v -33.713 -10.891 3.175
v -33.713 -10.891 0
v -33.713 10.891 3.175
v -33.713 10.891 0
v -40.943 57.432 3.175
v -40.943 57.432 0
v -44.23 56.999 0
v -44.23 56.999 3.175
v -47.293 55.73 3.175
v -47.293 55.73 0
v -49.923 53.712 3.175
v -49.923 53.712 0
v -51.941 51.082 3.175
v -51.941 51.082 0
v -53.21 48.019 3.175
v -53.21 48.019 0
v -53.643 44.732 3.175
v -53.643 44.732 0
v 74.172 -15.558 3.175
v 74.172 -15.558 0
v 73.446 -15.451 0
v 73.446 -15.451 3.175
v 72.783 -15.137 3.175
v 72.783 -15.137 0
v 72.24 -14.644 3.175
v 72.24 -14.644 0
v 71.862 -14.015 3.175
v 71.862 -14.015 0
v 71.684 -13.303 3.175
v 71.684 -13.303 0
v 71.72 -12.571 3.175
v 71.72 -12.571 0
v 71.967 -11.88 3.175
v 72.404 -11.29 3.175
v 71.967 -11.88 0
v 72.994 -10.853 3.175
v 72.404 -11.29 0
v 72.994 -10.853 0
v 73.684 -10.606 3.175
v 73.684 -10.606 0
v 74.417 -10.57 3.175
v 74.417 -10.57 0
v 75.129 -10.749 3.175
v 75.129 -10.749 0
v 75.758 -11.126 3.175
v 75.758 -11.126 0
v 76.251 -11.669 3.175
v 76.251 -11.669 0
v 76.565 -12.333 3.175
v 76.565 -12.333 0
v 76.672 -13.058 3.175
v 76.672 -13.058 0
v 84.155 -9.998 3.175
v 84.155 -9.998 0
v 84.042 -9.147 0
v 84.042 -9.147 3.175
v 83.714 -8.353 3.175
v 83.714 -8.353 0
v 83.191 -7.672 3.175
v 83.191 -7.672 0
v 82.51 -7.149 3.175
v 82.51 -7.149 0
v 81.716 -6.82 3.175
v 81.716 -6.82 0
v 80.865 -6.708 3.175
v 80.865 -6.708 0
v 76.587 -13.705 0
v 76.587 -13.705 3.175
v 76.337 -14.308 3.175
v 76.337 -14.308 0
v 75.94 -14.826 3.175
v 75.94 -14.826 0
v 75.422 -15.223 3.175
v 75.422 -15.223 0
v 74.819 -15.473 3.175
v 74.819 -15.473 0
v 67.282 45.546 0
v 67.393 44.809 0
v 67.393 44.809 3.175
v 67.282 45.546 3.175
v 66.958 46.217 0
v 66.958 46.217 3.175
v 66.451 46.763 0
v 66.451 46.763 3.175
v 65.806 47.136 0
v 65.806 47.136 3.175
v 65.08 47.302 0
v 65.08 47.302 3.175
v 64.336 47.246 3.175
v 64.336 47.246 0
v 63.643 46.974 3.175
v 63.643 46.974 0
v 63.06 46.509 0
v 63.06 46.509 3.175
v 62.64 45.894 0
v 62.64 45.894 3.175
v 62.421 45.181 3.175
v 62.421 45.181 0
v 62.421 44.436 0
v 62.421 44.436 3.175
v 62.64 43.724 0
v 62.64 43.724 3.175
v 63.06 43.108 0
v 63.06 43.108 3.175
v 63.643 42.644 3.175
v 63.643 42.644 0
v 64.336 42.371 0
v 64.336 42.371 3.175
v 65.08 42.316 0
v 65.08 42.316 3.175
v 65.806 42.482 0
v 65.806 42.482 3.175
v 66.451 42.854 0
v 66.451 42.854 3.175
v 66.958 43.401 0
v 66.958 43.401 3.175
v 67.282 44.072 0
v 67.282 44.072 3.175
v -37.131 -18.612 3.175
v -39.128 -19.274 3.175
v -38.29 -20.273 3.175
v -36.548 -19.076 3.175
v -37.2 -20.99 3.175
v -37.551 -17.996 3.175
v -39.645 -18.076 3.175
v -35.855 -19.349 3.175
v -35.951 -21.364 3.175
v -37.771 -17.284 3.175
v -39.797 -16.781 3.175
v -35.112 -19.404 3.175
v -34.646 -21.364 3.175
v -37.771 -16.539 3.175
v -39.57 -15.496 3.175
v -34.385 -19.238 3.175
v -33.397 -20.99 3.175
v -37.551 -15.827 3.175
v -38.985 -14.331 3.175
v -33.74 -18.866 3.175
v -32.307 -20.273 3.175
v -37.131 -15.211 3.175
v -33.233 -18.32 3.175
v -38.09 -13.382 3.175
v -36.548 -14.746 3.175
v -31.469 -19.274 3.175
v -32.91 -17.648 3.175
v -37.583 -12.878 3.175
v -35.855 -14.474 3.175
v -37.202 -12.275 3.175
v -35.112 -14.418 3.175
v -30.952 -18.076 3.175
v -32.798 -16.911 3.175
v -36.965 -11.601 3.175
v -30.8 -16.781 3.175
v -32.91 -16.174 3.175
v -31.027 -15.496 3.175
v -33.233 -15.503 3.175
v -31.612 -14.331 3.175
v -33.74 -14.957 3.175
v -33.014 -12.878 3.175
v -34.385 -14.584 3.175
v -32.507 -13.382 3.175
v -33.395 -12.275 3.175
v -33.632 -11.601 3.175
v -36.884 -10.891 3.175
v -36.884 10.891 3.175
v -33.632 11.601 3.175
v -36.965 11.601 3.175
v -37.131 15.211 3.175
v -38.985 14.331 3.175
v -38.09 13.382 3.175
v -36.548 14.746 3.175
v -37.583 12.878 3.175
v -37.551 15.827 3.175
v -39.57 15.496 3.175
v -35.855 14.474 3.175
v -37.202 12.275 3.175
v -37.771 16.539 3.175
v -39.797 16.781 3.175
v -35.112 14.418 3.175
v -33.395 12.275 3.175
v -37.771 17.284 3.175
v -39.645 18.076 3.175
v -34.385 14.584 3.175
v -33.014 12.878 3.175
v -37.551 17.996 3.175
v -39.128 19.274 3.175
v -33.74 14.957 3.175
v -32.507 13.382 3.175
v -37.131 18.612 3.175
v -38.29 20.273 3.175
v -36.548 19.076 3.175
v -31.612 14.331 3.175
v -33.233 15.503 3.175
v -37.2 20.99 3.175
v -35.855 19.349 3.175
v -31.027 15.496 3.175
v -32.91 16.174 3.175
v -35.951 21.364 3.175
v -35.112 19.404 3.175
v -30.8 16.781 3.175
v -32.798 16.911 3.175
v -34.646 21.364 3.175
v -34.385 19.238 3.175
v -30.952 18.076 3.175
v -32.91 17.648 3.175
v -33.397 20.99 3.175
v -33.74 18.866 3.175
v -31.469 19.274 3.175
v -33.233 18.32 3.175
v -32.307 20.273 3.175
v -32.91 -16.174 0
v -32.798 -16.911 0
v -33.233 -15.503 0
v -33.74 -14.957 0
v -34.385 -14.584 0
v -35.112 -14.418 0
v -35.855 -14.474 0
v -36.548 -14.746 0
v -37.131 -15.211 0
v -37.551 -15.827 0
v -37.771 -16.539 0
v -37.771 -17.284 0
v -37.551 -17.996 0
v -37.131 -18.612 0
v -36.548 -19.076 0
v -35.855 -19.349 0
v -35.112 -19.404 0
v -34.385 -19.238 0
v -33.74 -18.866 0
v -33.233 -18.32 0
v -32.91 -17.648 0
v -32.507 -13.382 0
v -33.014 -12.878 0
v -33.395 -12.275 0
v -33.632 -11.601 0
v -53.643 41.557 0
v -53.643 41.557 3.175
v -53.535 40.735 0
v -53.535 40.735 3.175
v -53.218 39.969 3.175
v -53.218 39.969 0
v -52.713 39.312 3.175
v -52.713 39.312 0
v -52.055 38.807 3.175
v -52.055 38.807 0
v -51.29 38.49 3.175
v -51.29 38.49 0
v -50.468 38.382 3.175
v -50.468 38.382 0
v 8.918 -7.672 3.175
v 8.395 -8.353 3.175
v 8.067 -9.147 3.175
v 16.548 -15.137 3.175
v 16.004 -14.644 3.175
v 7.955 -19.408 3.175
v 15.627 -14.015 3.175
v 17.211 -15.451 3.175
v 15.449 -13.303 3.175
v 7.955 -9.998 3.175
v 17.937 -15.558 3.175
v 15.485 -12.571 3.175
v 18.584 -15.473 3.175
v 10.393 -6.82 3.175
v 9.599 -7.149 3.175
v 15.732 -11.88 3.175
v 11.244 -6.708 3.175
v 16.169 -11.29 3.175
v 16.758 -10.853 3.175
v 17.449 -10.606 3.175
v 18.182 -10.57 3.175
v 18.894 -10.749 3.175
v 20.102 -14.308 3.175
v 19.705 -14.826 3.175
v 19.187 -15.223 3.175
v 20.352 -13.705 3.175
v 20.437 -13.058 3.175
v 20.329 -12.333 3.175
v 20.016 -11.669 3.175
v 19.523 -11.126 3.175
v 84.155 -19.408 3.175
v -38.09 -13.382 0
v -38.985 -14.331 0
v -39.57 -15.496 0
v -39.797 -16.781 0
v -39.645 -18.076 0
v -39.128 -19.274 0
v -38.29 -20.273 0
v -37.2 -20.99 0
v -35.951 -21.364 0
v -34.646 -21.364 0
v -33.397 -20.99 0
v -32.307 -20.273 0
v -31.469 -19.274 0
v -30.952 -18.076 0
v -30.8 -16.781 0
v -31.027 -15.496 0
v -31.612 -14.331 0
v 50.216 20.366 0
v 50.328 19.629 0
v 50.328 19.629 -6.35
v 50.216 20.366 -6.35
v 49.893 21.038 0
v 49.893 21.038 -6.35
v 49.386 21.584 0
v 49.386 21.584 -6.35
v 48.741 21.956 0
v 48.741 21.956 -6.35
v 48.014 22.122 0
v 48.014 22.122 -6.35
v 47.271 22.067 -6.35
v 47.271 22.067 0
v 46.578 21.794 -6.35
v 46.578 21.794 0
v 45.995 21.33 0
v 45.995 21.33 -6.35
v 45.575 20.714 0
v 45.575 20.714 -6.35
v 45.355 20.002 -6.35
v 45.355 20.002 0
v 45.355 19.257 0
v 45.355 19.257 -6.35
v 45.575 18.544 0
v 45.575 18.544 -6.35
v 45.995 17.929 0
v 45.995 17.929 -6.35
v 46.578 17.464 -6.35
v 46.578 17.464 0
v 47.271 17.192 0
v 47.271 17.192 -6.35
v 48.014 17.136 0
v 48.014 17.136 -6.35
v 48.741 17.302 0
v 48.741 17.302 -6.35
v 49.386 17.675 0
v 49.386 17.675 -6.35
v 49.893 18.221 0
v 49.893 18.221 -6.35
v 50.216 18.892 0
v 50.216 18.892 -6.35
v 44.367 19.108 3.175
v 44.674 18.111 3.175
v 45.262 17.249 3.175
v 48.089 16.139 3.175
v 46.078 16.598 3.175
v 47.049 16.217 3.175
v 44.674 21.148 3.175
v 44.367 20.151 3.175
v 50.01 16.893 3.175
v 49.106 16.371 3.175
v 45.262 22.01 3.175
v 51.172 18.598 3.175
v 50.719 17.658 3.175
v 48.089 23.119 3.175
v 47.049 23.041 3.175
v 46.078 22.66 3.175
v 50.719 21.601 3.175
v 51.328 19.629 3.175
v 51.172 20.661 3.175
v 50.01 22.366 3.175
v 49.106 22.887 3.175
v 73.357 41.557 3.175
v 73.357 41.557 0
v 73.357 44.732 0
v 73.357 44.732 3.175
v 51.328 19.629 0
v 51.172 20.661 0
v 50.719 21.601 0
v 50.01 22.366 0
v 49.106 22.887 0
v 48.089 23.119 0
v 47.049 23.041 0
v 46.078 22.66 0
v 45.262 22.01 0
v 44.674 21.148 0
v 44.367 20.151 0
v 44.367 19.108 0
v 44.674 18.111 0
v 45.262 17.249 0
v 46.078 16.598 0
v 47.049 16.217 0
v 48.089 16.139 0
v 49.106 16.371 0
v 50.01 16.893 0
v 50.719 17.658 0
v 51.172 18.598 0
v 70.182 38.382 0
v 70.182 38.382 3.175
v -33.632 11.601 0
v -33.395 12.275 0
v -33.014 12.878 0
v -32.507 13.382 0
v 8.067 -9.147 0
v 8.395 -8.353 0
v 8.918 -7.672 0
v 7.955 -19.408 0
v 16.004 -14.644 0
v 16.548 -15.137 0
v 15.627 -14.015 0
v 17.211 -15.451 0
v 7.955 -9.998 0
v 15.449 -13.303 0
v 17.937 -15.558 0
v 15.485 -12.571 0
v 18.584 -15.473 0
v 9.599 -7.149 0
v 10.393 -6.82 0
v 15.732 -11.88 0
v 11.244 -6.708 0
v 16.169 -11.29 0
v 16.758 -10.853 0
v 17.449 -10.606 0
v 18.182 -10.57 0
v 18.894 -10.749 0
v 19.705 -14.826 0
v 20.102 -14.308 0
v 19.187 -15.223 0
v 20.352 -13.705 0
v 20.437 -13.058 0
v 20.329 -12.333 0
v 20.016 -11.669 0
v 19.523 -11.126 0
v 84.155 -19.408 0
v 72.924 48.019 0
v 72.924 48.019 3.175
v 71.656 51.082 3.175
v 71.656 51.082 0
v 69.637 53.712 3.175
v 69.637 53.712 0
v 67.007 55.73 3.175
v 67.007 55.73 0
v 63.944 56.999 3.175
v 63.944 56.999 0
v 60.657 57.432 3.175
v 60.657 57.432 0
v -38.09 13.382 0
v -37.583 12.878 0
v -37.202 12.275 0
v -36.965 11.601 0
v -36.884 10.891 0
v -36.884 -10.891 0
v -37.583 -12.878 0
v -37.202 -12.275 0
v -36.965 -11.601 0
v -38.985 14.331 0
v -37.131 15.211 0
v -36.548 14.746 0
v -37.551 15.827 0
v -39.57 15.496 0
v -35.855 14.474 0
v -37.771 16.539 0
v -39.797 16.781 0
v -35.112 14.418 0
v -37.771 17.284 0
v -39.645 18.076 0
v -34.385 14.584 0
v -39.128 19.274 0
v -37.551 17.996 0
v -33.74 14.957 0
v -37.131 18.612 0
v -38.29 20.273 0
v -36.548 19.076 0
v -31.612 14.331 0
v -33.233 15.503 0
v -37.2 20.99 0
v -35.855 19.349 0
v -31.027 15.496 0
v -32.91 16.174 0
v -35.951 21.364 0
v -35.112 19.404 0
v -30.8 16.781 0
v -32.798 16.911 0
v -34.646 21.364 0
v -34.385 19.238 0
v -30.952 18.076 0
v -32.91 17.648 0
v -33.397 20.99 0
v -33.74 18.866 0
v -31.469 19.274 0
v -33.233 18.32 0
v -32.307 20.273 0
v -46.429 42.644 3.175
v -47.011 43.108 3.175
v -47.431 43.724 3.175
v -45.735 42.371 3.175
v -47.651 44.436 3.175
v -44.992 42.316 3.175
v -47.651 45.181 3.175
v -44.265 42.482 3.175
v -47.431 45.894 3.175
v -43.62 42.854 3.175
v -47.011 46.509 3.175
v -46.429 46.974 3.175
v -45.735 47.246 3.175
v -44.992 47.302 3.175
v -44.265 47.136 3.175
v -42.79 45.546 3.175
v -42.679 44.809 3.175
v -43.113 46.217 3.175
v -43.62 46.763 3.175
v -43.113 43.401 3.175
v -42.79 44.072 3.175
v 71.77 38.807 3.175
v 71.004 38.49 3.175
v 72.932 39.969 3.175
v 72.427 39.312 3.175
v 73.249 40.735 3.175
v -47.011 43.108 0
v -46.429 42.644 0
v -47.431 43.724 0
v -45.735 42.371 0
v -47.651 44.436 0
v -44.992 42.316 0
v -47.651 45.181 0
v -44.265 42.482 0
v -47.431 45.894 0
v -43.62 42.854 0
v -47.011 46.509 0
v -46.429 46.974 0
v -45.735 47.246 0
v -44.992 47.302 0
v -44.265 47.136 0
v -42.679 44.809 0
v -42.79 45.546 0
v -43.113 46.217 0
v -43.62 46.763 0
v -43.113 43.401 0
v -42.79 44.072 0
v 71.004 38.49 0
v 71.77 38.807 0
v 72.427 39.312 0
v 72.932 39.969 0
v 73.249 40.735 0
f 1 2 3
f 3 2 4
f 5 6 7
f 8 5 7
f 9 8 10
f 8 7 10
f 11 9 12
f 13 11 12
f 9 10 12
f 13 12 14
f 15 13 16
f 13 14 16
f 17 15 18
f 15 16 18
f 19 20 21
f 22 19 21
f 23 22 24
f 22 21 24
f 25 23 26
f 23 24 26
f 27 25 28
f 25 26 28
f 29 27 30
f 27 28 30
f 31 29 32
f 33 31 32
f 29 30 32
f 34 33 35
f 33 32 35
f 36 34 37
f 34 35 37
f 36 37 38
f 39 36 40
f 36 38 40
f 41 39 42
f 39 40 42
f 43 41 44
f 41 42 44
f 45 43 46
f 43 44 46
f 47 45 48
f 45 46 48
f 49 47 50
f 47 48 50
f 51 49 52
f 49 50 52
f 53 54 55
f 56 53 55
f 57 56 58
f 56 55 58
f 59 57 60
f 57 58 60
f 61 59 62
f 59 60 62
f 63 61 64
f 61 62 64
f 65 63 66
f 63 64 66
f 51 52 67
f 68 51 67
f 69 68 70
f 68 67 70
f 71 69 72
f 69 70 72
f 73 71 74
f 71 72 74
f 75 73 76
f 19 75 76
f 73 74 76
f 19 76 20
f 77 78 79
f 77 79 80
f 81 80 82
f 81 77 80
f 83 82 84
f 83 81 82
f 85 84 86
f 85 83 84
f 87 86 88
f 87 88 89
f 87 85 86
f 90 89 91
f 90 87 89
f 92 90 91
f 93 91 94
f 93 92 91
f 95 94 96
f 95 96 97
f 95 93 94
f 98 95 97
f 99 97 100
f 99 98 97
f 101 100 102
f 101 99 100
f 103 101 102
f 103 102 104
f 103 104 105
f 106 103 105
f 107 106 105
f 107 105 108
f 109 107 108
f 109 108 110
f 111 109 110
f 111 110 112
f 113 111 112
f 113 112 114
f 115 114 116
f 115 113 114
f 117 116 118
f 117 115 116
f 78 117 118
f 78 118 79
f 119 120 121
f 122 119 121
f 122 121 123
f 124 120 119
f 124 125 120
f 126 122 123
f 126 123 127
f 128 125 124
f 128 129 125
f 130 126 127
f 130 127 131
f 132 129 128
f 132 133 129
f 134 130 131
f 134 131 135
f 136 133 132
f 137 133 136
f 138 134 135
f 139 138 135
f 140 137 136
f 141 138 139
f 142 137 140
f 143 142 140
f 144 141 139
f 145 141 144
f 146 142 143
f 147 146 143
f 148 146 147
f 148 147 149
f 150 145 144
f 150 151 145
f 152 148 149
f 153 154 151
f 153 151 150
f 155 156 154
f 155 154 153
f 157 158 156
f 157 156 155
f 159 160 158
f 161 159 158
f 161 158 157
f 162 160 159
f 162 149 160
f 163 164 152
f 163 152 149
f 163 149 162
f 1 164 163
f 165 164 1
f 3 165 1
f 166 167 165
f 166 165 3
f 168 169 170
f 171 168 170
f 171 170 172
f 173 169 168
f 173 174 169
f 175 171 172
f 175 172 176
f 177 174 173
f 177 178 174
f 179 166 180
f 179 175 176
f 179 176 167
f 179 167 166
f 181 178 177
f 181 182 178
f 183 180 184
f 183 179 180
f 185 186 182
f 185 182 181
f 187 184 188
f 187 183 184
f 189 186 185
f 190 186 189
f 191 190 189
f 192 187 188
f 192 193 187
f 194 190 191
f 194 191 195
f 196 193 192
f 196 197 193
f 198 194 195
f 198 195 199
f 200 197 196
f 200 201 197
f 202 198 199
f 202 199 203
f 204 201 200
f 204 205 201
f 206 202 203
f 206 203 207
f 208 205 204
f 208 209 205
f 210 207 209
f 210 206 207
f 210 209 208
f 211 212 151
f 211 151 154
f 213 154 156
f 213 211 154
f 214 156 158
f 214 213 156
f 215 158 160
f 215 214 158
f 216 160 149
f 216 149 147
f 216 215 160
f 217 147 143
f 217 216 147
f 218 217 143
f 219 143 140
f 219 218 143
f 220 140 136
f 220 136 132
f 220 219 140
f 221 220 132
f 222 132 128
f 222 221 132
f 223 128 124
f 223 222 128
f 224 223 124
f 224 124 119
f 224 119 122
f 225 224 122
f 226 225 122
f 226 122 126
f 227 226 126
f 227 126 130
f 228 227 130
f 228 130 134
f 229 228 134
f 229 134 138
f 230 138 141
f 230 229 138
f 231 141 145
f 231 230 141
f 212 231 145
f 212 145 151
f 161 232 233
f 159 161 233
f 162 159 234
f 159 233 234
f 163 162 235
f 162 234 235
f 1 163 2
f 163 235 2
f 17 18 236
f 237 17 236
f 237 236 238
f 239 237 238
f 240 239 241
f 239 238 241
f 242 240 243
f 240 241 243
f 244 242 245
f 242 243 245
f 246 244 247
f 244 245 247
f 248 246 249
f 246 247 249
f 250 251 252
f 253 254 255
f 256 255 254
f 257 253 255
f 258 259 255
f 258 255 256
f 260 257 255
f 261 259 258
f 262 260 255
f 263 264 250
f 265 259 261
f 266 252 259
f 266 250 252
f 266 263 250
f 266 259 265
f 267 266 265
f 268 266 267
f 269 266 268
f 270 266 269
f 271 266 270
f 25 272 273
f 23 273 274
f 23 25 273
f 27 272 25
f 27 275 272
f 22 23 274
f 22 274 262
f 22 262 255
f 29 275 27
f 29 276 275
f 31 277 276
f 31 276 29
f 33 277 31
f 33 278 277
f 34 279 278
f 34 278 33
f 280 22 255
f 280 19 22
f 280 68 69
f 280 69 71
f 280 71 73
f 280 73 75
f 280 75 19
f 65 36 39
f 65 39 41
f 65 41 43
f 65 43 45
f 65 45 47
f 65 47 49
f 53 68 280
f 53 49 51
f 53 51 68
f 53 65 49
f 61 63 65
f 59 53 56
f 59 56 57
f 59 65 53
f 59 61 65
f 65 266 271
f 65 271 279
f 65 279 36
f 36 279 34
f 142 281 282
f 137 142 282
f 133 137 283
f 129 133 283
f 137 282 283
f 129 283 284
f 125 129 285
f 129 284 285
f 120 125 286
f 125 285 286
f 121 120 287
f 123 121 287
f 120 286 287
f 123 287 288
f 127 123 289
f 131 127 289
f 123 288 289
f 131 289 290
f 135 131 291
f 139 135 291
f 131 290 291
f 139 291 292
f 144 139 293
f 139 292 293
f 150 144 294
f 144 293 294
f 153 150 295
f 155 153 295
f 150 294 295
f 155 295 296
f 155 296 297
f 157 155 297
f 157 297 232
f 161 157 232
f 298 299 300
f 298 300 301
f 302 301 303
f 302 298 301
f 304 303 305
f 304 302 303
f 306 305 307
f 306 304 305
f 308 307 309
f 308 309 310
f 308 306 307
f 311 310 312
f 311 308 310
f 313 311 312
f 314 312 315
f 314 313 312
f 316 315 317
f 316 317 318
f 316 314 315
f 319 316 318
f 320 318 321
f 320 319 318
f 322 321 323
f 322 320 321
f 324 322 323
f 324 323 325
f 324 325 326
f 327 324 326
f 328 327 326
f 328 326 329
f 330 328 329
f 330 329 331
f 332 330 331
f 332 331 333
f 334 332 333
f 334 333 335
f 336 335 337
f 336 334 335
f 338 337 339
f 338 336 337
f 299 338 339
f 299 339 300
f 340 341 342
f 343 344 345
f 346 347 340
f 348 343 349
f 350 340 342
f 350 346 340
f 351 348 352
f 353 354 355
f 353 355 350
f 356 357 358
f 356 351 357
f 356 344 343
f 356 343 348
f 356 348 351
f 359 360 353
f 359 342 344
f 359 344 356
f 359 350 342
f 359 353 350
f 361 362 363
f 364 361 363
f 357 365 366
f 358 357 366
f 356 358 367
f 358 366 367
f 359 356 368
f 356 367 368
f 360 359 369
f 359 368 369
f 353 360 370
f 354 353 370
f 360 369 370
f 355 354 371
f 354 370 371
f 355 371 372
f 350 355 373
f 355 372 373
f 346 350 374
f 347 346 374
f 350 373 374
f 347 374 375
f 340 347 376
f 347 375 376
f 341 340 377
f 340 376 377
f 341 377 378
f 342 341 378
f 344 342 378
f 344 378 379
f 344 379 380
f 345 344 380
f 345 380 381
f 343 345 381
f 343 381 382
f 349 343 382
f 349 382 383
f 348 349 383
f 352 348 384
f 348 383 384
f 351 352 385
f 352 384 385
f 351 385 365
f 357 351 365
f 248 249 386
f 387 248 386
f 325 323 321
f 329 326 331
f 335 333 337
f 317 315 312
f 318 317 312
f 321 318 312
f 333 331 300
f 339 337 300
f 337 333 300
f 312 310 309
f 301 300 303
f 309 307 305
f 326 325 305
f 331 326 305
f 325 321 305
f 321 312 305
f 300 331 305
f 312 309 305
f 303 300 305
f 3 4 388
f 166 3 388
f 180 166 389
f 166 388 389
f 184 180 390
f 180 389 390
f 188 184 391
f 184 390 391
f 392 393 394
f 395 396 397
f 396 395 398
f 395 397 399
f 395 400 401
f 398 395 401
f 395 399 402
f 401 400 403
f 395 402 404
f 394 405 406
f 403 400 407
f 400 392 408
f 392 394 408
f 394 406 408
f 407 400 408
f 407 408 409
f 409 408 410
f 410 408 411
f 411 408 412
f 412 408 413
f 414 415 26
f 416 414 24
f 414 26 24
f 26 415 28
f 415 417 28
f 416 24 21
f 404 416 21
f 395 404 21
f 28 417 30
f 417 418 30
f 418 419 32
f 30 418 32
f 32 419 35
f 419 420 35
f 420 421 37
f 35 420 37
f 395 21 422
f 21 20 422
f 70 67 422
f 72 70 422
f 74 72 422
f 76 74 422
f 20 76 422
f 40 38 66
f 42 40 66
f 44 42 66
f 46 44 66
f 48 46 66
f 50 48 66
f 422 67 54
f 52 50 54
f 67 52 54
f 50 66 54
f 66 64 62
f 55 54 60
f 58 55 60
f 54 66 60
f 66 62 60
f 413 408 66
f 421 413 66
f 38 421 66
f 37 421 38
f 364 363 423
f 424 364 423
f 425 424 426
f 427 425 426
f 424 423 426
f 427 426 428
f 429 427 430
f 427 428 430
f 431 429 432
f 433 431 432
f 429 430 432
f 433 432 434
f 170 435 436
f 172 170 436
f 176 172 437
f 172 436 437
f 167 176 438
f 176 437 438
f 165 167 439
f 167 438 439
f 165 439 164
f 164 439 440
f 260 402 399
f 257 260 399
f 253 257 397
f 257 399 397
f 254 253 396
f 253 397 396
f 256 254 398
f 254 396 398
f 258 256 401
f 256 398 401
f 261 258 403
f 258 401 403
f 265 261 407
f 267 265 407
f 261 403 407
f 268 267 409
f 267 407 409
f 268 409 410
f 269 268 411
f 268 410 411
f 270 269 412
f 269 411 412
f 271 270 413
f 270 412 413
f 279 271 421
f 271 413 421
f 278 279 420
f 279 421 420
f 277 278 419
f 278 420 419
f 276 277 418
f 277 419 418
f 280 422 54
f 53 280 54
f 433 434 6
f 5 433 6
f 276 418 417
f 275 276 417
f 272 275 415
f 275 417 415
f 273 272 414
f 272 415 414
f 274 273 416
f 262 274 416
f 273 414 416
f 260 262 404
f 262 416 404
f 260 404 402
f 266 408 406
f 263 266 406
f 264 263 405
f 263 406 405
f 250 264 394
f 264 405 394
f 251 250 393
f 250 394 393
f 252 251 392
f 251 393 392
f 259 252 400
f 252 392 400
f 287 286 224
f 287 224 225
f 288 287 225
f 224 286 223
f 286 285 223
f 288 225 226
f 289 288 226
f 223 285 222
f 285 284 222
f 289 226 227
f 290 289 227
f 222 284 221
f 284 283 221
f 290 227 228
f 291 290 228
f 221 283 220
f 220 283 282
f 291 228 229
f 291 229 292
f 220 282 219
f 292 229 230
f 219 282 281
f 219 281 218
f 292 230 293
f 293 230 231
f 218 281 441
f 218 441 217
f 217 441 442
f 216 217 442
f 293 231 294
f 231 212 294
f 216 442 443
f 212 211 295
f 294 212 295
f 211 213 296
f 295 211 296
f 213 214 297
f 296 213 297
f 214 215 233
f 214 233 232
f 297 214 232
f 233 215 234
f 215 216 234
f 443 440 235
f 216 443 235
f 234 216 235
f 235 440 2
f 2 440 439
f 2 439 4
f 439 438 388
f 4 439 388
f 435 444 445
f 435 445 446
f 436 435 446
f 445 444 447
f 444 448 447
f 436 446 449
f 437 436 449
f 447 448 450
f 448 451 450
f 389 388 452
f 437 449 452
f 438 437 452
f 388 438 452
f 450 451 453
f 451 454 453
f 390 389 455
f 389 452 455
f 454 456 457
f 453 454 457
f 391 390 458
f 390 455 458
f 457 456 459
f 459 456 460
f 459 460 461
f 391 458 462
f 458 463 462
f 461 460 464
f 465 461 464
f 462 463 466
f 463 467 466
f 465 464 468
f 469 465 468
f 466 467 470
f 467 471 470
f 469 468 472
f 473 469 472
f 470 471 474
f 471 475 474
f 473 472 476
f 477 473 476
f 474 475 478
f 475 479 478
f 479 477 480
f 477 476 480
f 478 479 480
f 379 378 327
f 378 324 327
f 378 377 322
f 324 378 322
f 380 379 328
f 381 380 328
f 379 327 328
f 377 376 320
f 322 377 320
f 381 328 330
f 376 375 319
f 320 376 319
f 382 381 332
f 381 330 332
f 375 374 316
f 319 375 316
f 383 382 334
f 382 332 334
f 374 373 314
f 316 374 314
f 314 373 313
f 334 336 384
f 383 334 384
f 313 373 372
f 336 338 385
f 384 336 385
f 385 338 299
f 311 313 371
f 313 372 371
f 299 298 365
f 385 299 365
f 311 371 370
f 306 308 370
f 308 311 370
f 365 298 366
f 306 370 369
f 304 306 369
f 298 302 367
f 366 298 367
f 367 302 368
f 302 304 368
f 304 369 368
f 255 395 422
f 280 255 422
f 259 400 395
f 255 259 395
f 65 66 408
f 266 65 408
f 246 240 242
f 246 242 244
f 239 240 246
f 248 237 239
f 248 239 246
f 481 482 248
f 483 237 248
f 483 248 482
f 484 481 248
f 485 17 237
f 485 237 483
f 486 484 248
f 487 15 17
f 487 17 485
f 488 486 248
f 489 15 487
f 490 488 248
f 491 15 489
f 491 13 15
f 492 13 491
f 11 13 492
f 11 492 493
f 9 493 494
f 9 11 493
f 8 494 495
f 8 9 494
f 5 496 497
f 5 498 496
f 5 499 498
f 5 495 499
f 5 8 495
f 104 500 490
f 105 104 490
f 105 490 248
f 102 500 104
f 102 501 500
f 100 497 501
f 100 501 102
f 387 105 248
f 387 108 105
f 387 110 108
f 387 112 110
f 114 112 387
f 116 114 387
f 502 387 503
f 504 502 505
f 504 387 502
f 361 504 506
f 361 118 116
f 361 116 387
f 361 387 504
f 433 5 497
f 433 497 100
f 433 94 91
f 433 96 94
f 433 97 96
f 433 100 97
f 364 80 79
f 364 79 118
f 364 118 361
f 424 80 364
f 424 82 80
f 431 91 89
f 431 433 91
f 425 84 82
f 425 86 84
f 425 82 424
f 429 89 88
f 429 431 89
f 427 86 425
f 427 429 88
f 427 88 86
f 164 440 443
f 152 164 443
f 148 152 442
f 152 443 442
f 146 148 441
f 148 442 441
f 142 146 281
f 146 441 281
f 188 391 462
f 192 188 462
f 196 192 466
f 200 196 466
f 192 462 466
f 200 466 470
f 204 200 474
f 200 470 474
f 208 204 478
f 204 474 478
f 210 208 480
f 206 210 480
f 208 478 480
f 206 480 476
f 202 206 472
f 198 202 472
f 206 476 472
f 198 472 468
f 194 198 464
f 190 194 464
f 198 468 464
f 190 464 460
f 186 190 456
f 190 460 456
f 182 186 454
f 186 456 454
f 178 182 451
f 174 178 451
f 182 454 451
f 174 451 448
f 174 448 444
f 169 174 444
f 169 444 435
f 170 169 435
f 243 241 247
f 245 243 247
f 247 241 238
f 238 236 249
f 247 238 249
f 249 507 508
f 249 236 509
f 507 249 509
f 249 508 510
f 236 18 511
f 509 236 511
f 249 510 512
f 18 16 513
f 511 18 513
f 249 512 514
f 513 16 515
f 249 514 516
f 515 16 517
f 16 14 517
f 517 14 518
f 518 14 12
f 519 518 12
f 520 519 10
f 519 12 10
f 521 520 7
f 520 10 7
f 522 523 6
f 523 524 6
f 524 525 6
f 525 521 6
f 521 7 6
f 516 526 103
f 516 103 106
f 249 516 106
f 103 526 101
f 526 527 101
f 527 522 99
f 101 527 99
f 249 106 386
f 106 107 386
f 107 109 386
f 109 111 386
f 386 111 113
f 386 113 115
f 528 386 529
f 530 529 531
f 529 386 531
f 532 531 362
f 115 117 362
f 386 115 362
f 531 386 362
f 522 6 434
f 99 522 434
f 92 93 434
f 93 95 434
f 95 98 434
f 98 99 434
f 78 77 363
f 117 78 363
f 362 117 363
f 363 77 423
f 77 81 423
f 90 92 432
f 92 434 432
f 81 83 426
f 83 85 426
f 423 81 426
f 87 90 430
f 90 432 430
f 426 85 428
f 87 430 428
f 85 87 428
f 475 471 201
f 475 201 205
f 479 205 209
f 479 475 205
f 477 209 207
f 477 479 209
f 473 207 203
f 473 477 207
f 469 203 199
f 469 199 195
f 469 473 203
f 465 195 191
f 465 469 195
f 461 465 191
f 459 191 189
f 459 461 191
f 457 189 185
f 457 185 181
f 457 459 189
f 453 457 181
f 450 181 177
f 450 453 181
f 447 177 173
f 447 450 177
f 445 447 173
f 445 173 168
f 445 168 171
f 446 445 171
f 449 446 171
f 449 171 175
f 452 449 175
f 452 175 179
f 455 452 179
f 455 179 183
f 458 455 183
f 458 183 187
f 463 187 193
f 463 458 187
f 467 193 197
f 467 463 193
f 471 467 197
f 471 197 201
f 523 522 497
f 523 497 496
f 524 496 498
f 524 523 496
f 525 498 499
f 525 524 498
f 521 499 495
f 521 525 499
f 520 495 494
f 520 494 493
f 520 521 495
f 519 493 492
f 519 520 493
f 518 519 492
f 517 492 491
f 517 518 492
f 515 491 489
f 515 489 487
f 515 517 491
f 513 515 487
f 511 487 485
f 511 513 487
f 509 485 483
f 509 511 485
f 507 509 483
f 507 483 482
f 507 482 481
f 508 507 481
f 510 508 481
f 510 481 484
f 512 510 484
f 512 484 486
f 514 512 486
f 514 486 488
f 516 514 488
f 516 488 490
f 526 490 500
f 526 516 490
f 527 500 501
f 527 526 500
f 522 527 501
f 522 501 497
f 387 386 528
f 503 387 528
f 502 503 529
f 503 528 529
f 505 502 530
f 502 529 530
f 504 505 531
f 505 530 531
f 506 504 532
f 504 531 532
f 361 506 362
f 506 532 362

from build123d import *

# Parameters (mm, degrees)
F0_R     = 2.5
F1_DEPTH = 3.175
F2_R     = 2.5
F3_DEPTH = 3.175
F4_R     = 2.5
F5_DEPTH = 6.35
F4_R_2   = 3.5
F6_DEPTH = 3.175
F8_DEPTH = 3.175


# Not quite as in the source:
# - a length typed as a fraction of an inch, garbled in the dataset ("3 / 203.2 mm" for 3/8 in), is restored


with BuildPart() as f1:
    # F0 (on Top) → F1 (new body)
    with BuildSketch(Plane.XY):
        with BuildLine():
            ThreePointArc((-33.712554723, 10.891355979), (-33.3953284467, 12.2747410823), (-32.5070401756, 13.3816876943))
            ThreePointArc((-32.5070401756, 13.3816876943), (-35.2984368801, 21.4112917002), (-38.0898335846, 13.3816876943))
            ThreePointArc((-38.0898335846, 13.3816876943), (-37.2015453135, 12.2747410823), (-36.8843190372, 10.891355979))
            Line((-36.8843190372, 10.891355979), (-36.8843190372, 0))
            Line((-36.8843190372, 0), (-33.712554723, 0))
            Line((-33.712554723, 0), (-33.712554723, 10.891355979))
        make_face()
        with Locations((-35.2984368801, 16.9112917002)):
            Circle(F0_R, mode=Mode.SUBTRACT)
        with BuildLine():
            Line((-33.712554723, -10.891355979), (-33.712554723, 0))
            Line((-33.712554723, 0), (-36.8843190372, 0))
            Line((-36.8843190372, 0), (-36.8843190372, -10.891355979))
            ThreePointArc((-36.8843190372, -10.891355979), (-37.2015453135, -12.2747410823), (-38.0898335846, -13.3816876943))
            ThreePointArc((-38.0898335846, -13.3816876943), (-35.2984368801, -21.4112917002), (-32.5070401756, -13.3816876943))
            ThreePointArc((-32.5070401756, -13.3816876943), (-33.3953284467, -12.2747410823), (-33.712554723, -10.891355979))
        make_face()
        with Locations((-35.2984368801, -16.9112917002)):
            Circle(F0_R, mode=Mode.SUBTRACT)
    extrude(amount=F1_DEPTH)


with BuildPart() as f3:
    # F2 (on Top) → F3 (new body)
    with BuildSketch(Plane.XY):
        with BuildLine():
            ThreePointArc((-53.6429062486, 41.5569074162), (-52.7129702788, 39.3118433859), (-50.4679062486, 38.3819074162))
            Line((-50.4679062486, 38.3819074162), (9.8570937514, 38.3819074162))
            Line((9.8570937514, 38.3819074162), (70.1820937514, 38.3819074162))
            ThreePointArc((70.1820937514, 38.3819074162), (72.4271577817, 39.3118433859), (73.3570937514, 41.5569074162))
            Line((73.3570937514, 41.5569074162), (73.3570937514, 44.7319074162))
            ThreePointArc((73.3570937514, 44.7319074162), (69.6373498725, 53.7121635373), (60.6570937514, 57.4319074162))
            Line((60.6570937514, 57.4319074162), (9.8570937514, 57.4319074162))
            Line((9.8570937514, 57.4319074162), (-40.9429062486, 57.4319074162))
            ThreePointArc((-40.9429062486, 57.4319074162), (-49.9231623696, 53.7121635373), (-53.6429062486, 44.7319074162))
            Line((-53.6429062486, 44.7319074162), (-53.6429062486, 41.5569074162))
        make_face()
        with Locations((-45.1785493704, 44.8088147985)):
            Circle(F2_R, mode=Mode.SUBTRACT)
        with Locations((64.8927368733, 44.8088147985)):
            Circle(F2_R, mode=Mode.SUBTRACT)
    extrude(amount=F3_DEPTH)


with BuildPart() as f5:
    # F4 (on Top) → F5 (new body)
    with BuildSketch(Plane.XY):
        with Locations((47.8275045753, 19.6292065084)):
            Circle(F4_R)
    extrude(amount=-F5_DEPTH)

    # F4 (on Top) → F6 (join)
    with BuildSketch(Plane.XY):
        with Locations((47.8275045753, 19.6292065084)):
            Circle(F4_R_2)
        with Locations((47.8275045753, 19.6292065084)):
            Circle(F4_R, mode=Mode.SUBTRACT)
        with Locations((47.8275045753, 19.6292065084)):
            Circle(F4_R)
    extrude(amount=F6_DEPTH)


with BuildPart() as f8:
    # F7 (on Top) → F8 (new body)
    with BuildSketch(Plane.XY):
        with BuildLine():
            Line((46.0545447382, -6.708232842), (11.2443861502, -6.708232842))
            ThreePointArc((11.2443861502, -6.708232842), (8.9181169788, -7.6718050825), (7.9545447382, -9.9980742539))
            Line((7.9545447382, -9.9980742539), (7.9545447382, -19.408232842))
            Line((7.9545447382, -19.408232842), (17.9369021207, -19.408232842))
            Line((17.9369021207, -19.408232842), (46.0545447382, -19.408232842))
            Line((46.0545447382, -19.408232842), (74.1721873558, -19.408232842))
            Line((74.1721873558, -19.408232842), (84.1545447382, -19.408232842))
            Line((84.1545447382, -19.408232842), (84.1545447382, -9.9980742539))
            ThreePointArc((84.1545447382, -9.9980742539), (83.1909724977, -7.6718050825), (80.8647033263, -6.708232842))
            Line((80.8647033263, -6.708232842), (46.0545447382, -6.708232842))
        make_face()
        with BuildLine():
            ThreePointArc((20.4369021207, -13.058232842), (19.7046690737, -14.825999795), (17.9369021207, -15.558232842))
            ThreePointArc((17.9369021207, -15.558232842), (16.1691351677, -11.290465889), (20.4369021207, -13.058232842))
        make_face(mode=Mode.SUBTRACT)
        with BuildLine():
            ThreePointArc((76.6721873558, -13.058232842), (75.9399543087, -14.825999795), (74.1721873558, -15.558232842))
            ThreePointArc((74.1721873558, -15.558232842), (72.4044204028, -11.290465889), (76.6721873558, -13.058232842))
        make_face(mode=Mode.SUBTRACT)
    extrude(amount=F8_DEPTH)


solid = Compound([f1.part, f3.part, f5.part, f8.part])
